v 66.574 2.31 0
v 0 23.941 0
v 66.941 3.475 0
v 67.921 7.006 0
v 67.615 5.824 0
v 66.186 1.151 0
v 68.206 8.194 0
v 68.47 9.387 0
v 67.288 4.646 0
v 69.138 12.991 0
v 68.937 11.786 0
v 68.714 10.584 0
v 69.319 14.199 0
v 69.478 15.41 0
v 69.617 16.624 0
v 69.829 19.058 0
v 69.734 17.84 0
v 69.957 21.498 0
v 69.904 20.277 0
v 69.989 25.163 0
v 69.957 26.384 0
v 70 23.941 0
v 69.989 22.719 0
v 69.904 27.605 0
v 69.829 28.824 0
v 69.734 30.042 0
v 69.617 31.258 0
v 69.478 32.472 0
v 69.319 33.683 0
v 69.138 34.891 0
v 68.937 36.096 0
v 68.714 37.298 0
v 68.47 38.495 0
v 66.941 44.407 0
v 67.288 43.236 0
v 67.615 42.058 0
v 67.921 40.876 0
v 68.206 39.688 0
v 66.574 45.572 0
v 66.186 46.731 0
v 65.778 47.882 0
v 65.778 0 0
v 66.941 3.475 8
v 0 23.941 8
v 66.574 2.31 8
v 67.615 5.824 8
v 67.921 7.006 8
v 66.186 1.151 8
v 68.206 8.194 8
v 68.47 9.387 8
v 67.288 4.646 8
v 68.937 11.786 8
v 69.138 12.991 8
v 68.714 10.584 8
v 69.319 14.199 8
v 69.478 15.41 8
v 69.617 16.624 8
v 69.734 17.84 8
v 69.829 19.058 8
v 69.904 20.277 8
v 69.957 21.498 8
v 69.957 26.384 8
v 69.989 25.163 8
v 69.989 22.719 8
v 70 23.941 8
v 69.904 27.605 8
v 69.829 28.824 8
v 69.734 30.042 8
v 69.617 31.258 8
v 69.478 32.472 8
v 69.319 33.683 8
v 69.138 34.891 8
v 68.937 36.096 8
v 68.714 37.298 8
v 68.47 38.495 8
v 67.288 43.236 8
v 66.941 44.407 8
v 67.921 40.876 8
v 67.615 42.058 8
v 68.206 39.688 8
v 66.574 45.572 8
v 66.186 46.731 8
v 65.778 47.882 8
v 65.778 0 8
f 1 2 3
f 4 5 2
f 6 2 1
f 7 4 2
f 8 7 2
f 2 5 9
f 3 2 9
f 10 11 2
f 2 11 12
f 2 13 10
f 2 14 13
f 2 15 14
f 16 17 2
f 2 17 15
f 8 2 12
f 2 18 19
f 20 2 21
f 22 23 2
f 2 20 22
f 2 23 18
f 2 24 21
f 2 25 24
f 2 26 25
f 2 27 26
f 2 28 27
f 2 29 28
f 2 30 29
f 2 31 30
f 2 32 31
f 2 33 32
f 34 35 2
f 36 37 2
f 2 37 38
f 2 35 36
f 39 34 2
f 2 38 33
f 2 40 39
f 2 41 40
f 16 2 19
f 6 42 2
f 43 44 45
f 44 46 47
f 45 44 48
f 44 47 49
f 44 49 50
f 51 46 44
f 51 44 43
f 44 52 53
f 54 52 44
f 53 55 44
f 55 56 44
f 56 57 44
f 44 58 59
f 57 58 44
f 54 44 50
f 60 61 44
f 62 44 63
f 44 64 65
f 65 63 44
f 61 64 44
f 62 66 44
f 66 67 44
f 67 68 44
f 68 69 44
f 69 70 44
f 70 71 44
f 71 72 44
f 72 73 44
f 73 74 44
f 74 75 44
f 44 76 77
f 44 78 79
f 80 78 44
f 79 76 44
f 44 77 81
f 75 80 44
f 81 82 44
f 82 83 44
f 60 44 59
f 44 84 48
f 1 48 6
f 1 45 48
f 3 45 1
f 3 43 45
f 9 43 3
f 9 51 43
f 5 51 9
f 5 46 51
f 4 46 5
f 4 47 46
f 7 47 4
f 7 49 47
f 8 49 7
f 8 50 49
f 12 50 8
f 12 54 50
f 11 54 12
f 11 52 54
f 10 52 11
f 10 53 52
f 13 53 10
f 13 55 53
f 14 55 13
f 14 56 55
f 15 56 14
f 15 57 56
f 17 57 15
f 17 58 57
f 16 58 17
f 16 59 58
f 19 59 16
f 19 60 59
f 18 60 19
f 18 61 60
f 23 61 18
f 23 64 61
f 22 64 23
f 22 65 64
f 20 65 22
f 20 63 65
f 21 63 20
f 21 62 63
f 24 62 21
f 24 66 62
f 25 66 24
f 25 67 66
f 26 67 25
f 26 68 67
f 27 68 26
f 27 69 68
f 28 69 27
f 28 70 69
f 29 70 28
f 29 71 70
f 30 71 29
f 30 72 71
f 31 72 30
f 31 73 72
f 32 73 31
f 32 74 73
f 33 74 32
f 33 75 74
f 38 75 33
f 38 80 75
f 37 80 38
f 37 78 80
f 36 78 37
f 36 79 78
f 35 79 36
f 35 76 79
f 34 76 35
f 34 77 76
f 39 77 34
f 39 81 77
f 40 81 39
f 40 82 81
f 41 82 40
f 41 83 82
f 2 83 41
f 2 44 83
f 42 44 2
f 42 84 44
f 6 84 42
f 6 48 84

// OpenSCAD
$fn = 32;

// ----------------------------------------------------------------------
// Arc profile plate: sector, 42 points
// ----------------------------------------------------------------------

// --- parameters (mm) ---
sector_angle = 40;        // sector angle, degrees
sector_r = 70;            // outer radius
arc_step = 1;             // sampling step of the arc, degrees
plate_t = 8;              // plate thickness, Z

bbox_x = 2 * sector_r * sin(sector_angle / 2);  // chord of the sector
bbox_y = sector_r;  // depth of the sector (apex to arc)

profile = [[65.778, 0], [66.186, 1.151], [66.574, 2.31], [66.941, 3.475], [67.288, 4.646], [67.615, 5.824], [67.921, 7.006], [68.206, 8.194], [68.47, 9.387], [68.714, 10.584], [68.937, 11.786], [69.138, 12.991], [69.319, 14.199], [69.478, 15.41], [69.617, 16.624], [69.734, 17.84], [69.829, 19.058], [69.904, 20.277], [69.957, 21.498], [69.989, 22.719], [70, 23.941], [69.989, 25.163], [69.957, 26.384], [69.904, 27.605], [69.829, 28.824], [69.734, 30.042], [69.617, 31.258], [69.478, 32.472], [69.319, 33.683], [69.138, 34.891], [68.937, 36.096], [68.714, 37.298], [68.47, 38.495], [68.206, 39.688], [67.921, 40.876], [67.615, 42.058], [67.288, 43.236], [66.941, 44.407], [66.574, 45.572], [66.186, 46.731], [65.778, 47.882], [0, 23.941]];  // primary outline, 42 points, counter clockwise

// --- the one profile operation ---
linear_extrude(height = plate_t) polygon(points = profile);
